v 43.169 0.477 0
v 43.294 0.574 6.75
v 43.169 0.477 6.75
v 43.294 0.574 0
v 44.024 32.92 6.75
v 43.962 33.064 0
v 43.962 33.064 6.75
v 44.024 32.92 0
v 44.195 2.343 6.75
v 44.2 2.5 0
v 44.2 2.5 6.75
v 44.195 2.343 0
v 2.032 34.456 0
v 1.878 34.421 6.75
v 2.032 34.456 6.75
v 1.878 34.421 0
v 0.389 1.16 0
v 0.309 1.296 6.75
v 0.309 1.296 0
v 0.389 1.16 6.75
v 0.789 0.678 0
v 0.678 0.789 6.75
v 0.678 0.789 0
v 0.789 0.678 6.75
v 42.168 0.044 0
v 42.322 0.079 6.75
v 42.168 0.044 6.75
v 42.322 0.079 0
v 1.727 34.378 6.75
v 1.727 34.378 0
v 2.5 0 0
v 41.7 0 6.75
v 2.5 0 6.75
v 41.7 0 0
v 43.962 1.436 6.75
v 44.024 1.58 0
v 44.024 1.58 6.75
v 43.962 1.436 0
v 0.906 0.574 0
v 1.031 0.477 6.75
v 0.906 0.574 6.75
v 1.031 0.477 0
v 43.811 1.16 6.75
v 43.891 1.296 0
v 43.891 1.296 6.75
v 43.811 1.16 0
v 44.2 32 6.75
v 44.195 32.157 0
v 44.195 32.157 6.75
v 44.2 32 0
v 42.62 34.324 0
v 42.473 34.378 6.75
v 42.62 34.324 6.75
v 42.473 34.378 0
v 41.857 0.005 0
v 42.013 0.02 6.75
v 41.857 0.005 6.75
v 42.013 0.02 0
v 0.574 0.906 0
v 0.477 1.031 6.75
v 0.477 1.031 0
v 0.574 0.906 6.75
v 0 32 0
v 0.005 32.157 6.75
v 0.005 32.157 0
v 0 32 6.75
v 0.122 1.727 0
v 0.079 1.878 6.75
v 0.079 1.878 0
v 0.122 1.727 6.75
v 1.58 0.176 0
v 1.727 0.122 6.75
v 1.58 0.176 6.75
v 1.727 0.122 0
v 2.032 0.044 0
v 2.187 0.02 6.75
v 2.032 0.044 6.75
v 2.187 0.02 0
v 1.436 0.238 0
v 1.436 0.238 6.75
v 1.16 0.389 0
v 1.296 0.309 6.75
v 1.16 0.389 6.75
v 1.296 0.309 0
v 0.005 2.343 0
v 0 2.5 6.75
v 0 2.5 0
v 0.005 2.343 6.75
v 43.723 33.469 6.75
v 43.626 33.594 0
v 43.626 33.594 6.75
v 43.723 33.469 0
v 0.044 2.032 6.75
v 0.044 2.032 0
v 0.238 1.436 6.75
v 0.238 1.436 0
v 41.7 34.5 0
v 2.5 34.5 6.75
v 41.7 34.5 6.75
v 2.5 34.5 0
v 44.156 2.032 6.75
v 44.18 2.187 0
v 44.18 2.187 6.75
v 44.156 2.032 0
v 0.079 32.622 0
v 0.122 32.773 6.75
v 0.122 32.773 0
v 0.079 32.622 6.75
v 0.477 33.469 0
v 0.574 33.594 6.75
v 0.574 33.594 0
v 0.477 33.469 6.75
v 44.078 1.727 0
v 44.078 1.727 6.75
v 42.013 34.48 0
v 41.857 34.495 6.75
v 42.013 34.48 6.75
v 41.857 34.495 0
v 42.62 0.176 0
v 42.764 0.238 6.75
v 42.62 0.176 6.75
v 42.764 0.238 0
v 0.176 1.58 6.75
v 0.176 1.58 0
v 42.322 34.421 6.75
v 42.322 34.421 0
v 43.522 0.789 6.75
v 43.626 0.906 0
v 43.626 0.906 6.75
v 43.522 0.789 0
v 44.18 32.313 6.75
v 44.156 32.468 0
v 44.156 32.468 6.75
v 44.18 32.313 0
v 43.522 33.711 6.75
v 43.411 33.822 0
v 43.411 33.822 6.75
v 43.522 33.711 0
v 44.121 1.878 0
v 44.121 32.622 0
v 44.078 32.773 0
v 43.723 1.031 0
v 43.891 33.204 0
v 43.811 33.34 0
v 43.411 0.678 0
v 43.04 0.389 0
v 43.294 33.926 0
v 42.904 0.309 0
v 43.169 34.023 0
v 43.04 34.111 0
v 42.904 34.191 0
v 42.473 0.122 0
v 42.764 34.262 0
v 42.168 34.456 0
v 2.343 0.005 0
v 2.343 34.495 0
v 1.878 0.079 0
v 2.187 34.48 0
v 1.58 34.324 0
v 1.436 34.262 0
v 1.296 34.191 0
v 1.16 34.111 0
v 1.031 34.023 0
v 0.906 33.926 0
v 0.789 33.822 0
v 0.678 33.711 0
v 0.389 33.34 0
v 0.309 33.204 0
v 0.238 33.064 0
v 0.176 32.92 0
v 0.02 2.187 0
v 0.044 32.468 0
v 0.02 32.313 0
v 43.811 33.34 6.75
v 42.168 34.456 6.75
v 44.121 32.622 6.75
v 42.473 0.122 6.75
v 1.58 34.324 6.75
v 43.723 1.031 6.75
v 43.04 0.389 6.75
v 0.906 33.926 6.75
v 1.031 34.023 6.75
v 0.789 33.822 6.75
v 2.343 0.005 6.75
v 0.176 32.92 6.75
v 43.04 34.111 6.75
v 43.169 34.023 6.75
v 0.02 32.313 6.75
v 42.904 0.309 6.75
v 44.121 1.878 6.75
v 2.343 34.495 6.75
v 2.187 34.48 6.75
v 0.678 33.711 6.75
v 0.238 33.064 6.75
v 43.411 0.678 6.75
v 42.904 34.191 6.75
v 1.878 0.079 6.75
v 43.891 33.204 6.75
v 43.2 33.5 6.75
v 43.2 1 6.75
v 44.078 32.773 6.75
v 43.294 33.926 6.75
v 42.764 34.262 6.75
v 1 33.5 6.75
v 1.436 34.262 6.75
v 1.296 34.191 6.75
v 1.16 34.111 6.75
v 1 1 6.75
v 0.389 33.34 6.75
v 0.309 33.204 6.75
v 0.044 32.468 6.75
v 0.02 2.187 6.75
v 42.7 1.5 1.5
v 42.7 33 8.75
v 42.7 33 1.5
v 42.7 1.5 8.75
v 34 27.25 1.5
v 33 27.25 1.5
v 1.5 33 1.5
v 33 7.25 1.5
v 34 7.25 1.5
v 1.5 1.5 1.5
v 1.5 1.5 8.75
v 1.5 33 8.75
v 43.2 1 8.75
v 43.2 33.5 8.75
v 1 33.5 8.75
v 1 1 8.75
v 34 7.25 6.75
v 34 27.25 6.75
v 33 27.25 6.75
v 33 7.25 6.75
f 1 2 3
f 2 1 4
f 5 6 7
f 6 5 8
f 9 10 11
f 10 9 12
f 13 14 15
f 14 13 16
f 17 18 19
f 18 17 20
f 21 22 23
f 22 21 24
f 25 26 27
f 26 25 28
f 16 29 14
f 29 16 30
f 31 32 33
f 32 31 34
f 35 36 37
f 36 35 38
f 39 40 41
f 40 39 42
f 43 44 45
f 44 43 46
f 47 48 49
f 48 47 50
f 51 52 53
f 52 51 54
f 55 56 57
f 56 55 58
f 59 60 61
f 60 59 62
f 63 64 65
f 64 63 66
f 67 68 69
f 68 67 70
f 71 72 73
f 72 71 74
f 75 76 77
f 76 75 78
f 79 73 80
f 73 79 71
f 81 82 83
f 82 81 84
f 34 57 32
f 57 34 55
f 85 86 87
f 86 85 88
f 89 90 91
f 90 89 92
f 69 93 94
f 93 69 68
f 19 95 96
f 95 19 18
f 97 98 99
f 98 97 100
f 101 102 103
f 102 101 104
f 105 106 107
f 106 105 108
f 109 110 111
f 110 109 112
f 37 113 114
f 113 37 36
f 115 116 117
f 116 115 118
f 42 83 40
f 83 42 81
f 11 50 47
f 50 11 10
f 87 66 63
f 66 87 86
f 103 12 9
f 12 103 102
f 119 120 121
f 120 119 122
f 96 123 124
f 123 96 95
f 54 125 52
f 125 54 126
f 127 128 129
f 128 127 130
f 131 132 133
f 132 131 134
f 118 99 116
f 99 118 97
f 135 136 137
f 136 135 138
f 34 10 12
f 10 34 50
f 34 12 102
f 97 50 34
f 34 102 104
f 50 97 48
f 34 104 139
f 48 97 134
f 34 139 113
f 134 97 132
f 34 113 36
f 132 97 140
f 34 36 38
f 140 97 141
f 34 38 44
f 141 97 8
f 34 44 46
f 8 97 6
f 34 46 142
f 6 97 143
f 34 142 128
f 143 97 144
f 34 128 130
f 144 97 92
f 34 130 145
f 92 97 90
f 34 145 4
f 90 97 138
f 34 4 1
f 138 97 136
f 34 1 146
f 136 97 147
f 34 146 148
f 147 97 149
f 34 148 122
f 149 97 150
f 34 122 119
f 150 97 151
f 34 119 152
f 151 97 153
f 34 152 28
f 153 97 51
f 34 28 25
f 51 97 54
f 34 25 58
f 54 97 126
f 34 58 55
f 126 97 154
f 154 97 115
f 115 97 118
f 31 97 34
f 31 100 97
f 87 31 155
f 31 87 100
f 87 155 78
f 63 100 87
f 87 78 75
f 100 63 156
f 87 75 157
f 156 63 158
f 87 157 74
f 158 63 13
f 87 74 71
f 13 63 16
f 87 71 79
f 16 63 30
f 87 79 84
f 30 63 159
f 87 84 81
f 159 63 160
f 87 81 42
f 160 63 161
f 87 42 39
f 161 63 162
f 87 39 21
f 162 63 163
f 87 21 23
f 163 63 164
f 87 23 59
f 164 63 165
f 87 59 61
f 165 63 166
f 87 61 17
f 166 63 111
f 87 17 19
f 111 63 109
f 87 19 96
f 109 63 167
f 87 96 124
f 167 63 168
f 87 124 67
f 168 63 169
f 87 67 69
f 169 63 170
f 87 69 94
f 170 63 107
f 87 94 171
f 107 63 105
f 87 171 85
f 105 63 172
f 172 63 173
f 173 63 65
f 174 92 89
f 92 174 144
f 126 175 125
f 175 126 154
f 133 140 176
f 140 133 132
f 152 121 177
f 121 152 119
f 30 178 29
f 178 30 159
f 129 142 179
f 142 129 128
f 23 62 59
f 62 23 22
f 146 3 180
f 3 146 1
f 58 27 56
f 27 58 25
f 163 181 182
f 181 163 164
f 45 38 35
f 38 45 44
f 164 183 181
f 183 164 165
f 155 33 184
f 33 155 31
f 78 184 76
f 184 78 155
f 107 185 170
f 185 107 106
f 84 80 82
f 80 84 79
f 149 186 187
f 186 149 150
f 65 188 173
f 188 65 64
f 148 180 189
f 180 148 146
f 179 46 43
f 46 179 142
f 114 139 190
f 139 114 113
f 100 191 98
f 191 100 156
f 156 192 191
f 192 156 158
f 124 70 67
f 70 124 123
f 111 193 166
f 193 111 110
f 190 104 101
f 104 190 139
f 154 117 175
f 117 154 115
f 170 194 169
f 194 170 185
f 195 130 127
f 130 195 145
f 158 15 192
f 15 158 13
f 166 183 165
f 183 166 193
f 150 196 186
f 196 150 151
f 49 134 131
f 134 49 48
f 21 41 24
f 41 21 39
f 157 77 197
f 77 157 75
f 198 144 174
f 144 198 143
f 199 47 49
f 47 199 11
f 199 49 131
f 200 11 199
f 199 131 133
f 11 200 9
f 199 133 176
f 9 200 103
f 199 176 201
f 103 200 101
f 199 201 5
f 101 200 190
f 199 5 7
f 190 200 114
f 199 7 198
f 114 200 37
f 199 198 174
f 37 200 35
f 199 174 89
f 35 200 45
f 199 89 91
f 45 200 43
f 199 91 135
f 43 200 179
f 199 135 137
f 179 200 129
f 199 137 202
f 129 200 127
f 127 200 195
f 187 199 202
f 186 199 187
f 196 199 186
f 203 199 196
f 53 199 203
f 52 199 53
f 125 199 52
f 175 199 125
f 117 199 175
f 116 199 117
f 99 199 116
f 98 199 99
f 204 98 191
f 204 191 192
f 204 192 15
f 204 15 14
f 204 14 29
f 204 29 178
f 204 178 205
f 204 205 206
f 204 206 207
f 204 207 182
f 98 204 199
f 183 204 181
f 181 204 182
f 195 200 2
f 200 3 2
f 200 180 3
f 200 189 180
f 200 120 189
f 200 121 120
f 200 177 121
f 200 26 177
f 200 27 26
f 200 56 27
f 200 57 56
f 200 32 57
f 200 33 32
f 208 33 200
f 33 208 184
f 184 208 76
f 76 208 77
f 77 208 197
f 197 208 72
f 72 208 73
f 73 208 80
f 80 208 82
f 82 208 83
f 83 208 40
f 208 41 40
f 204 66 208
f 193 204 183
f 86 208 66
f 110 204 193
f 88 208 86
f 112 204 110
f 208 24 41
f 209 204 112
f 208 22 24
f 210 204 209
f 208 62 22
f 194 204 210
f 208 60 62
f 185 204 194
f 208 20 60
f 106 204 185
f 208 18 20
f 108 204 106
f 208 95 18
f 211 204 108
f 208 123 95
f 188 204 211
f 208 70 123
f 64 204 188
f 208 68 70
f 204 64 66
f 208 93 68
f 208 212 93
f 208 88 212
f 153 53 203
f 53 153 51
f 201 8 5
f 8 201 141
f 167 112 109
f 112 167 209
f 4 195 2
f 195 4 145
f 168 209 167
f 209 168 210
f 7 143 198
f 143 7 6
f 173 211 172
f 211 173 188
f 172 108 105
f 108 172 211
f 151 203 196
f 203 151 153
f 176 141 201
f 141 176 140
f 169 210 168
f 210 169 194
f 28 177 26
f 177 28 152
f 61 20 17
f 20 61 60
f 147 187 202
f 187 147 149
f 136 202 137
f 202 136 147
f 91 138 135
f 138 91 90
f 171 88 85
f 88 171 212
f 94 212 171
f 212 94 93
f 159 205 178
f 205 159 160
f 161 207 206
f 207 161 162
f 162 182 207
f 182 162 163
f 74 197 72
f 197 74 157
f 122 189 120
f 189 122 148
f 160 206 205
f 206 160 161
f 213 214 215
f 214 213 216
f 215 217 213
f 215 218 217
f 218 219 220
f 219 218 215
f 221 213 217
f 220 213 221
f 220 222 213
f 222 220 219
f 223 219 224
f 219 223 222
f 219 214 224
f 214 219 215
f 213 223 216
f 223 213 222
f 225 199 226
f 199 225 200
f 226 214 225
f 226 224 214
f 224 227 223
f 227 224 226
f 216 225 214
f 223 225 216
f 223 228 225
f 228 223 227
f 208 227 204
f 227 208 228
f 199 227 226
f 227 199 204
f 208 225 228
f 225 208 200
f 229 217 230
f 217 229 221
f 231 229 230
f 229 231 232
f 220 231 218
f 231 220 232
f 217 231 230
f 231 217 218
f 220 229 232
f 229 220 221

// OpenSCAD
$fn = 100;

// vysota schemy
h = 10.5;
// enclousure params
paz = 2;
// enclousure wall thikness
wthikness = 1.5;
// i* - inner
iheight = h / 2;
iwidht = 31.5;
ilenght = 41.2;

// o* - outer
olenght = ilenght + wthikness * 2;
owidht = iwidht + wthikness * 2;
oheight = iheight + wthikness;
// corner radius
cr = 2.5;
pazcr = cr - 1; // s obei storon po 0.5 
// buttons radius
br = 3;

enclousureBottom(0, 0, 0);

module mainBox() {
    hull() {
        translate([cr, cr, 0]) {
            cylinder(r = cr, h = iheight + wthikness);
        }
        translate([olenght - cr, owidht - cr, 0]) {
            cylinder(r = cr, h = iheight + wthikness);
        }
        translate([olenght - cr, cr, 0]) {
            cylinder(r = cr, h = iheight + wthikness);
        }
        translate([cr, owidht - cr, 0]) {
            cylinder(r = cr, h = iheight + wthikness);
        }
    }
}

// Enclousure module
module enclousureBottom(xpos, ypos, zpos) {
    translate([xpos, ypos, zpos]) {
        difference() {
            mainBox();
            translate([wthikness, wthikness , wthikness]) {
                cube([ilenght, iwidht, iheight]);
            }
        }
        // Peregorodka
        translate([33, wthikness + (iwidht - 20) / 2, wthikness]) {
            cube([1, 20, iheight]);
        }
        // Paz
        translate([wthikness - 0.5 , wthikness - 0.5, wthikness + iheight]) {
            paz();
        }
    }
}

module paz() {
    difference() {
        cube([ilenght + 1, iwidht + 1, paz]);
        translate([0.5, 0.5, 0]) {
            cube([ilenght, iwidht, paz]);
        }
    }
}
